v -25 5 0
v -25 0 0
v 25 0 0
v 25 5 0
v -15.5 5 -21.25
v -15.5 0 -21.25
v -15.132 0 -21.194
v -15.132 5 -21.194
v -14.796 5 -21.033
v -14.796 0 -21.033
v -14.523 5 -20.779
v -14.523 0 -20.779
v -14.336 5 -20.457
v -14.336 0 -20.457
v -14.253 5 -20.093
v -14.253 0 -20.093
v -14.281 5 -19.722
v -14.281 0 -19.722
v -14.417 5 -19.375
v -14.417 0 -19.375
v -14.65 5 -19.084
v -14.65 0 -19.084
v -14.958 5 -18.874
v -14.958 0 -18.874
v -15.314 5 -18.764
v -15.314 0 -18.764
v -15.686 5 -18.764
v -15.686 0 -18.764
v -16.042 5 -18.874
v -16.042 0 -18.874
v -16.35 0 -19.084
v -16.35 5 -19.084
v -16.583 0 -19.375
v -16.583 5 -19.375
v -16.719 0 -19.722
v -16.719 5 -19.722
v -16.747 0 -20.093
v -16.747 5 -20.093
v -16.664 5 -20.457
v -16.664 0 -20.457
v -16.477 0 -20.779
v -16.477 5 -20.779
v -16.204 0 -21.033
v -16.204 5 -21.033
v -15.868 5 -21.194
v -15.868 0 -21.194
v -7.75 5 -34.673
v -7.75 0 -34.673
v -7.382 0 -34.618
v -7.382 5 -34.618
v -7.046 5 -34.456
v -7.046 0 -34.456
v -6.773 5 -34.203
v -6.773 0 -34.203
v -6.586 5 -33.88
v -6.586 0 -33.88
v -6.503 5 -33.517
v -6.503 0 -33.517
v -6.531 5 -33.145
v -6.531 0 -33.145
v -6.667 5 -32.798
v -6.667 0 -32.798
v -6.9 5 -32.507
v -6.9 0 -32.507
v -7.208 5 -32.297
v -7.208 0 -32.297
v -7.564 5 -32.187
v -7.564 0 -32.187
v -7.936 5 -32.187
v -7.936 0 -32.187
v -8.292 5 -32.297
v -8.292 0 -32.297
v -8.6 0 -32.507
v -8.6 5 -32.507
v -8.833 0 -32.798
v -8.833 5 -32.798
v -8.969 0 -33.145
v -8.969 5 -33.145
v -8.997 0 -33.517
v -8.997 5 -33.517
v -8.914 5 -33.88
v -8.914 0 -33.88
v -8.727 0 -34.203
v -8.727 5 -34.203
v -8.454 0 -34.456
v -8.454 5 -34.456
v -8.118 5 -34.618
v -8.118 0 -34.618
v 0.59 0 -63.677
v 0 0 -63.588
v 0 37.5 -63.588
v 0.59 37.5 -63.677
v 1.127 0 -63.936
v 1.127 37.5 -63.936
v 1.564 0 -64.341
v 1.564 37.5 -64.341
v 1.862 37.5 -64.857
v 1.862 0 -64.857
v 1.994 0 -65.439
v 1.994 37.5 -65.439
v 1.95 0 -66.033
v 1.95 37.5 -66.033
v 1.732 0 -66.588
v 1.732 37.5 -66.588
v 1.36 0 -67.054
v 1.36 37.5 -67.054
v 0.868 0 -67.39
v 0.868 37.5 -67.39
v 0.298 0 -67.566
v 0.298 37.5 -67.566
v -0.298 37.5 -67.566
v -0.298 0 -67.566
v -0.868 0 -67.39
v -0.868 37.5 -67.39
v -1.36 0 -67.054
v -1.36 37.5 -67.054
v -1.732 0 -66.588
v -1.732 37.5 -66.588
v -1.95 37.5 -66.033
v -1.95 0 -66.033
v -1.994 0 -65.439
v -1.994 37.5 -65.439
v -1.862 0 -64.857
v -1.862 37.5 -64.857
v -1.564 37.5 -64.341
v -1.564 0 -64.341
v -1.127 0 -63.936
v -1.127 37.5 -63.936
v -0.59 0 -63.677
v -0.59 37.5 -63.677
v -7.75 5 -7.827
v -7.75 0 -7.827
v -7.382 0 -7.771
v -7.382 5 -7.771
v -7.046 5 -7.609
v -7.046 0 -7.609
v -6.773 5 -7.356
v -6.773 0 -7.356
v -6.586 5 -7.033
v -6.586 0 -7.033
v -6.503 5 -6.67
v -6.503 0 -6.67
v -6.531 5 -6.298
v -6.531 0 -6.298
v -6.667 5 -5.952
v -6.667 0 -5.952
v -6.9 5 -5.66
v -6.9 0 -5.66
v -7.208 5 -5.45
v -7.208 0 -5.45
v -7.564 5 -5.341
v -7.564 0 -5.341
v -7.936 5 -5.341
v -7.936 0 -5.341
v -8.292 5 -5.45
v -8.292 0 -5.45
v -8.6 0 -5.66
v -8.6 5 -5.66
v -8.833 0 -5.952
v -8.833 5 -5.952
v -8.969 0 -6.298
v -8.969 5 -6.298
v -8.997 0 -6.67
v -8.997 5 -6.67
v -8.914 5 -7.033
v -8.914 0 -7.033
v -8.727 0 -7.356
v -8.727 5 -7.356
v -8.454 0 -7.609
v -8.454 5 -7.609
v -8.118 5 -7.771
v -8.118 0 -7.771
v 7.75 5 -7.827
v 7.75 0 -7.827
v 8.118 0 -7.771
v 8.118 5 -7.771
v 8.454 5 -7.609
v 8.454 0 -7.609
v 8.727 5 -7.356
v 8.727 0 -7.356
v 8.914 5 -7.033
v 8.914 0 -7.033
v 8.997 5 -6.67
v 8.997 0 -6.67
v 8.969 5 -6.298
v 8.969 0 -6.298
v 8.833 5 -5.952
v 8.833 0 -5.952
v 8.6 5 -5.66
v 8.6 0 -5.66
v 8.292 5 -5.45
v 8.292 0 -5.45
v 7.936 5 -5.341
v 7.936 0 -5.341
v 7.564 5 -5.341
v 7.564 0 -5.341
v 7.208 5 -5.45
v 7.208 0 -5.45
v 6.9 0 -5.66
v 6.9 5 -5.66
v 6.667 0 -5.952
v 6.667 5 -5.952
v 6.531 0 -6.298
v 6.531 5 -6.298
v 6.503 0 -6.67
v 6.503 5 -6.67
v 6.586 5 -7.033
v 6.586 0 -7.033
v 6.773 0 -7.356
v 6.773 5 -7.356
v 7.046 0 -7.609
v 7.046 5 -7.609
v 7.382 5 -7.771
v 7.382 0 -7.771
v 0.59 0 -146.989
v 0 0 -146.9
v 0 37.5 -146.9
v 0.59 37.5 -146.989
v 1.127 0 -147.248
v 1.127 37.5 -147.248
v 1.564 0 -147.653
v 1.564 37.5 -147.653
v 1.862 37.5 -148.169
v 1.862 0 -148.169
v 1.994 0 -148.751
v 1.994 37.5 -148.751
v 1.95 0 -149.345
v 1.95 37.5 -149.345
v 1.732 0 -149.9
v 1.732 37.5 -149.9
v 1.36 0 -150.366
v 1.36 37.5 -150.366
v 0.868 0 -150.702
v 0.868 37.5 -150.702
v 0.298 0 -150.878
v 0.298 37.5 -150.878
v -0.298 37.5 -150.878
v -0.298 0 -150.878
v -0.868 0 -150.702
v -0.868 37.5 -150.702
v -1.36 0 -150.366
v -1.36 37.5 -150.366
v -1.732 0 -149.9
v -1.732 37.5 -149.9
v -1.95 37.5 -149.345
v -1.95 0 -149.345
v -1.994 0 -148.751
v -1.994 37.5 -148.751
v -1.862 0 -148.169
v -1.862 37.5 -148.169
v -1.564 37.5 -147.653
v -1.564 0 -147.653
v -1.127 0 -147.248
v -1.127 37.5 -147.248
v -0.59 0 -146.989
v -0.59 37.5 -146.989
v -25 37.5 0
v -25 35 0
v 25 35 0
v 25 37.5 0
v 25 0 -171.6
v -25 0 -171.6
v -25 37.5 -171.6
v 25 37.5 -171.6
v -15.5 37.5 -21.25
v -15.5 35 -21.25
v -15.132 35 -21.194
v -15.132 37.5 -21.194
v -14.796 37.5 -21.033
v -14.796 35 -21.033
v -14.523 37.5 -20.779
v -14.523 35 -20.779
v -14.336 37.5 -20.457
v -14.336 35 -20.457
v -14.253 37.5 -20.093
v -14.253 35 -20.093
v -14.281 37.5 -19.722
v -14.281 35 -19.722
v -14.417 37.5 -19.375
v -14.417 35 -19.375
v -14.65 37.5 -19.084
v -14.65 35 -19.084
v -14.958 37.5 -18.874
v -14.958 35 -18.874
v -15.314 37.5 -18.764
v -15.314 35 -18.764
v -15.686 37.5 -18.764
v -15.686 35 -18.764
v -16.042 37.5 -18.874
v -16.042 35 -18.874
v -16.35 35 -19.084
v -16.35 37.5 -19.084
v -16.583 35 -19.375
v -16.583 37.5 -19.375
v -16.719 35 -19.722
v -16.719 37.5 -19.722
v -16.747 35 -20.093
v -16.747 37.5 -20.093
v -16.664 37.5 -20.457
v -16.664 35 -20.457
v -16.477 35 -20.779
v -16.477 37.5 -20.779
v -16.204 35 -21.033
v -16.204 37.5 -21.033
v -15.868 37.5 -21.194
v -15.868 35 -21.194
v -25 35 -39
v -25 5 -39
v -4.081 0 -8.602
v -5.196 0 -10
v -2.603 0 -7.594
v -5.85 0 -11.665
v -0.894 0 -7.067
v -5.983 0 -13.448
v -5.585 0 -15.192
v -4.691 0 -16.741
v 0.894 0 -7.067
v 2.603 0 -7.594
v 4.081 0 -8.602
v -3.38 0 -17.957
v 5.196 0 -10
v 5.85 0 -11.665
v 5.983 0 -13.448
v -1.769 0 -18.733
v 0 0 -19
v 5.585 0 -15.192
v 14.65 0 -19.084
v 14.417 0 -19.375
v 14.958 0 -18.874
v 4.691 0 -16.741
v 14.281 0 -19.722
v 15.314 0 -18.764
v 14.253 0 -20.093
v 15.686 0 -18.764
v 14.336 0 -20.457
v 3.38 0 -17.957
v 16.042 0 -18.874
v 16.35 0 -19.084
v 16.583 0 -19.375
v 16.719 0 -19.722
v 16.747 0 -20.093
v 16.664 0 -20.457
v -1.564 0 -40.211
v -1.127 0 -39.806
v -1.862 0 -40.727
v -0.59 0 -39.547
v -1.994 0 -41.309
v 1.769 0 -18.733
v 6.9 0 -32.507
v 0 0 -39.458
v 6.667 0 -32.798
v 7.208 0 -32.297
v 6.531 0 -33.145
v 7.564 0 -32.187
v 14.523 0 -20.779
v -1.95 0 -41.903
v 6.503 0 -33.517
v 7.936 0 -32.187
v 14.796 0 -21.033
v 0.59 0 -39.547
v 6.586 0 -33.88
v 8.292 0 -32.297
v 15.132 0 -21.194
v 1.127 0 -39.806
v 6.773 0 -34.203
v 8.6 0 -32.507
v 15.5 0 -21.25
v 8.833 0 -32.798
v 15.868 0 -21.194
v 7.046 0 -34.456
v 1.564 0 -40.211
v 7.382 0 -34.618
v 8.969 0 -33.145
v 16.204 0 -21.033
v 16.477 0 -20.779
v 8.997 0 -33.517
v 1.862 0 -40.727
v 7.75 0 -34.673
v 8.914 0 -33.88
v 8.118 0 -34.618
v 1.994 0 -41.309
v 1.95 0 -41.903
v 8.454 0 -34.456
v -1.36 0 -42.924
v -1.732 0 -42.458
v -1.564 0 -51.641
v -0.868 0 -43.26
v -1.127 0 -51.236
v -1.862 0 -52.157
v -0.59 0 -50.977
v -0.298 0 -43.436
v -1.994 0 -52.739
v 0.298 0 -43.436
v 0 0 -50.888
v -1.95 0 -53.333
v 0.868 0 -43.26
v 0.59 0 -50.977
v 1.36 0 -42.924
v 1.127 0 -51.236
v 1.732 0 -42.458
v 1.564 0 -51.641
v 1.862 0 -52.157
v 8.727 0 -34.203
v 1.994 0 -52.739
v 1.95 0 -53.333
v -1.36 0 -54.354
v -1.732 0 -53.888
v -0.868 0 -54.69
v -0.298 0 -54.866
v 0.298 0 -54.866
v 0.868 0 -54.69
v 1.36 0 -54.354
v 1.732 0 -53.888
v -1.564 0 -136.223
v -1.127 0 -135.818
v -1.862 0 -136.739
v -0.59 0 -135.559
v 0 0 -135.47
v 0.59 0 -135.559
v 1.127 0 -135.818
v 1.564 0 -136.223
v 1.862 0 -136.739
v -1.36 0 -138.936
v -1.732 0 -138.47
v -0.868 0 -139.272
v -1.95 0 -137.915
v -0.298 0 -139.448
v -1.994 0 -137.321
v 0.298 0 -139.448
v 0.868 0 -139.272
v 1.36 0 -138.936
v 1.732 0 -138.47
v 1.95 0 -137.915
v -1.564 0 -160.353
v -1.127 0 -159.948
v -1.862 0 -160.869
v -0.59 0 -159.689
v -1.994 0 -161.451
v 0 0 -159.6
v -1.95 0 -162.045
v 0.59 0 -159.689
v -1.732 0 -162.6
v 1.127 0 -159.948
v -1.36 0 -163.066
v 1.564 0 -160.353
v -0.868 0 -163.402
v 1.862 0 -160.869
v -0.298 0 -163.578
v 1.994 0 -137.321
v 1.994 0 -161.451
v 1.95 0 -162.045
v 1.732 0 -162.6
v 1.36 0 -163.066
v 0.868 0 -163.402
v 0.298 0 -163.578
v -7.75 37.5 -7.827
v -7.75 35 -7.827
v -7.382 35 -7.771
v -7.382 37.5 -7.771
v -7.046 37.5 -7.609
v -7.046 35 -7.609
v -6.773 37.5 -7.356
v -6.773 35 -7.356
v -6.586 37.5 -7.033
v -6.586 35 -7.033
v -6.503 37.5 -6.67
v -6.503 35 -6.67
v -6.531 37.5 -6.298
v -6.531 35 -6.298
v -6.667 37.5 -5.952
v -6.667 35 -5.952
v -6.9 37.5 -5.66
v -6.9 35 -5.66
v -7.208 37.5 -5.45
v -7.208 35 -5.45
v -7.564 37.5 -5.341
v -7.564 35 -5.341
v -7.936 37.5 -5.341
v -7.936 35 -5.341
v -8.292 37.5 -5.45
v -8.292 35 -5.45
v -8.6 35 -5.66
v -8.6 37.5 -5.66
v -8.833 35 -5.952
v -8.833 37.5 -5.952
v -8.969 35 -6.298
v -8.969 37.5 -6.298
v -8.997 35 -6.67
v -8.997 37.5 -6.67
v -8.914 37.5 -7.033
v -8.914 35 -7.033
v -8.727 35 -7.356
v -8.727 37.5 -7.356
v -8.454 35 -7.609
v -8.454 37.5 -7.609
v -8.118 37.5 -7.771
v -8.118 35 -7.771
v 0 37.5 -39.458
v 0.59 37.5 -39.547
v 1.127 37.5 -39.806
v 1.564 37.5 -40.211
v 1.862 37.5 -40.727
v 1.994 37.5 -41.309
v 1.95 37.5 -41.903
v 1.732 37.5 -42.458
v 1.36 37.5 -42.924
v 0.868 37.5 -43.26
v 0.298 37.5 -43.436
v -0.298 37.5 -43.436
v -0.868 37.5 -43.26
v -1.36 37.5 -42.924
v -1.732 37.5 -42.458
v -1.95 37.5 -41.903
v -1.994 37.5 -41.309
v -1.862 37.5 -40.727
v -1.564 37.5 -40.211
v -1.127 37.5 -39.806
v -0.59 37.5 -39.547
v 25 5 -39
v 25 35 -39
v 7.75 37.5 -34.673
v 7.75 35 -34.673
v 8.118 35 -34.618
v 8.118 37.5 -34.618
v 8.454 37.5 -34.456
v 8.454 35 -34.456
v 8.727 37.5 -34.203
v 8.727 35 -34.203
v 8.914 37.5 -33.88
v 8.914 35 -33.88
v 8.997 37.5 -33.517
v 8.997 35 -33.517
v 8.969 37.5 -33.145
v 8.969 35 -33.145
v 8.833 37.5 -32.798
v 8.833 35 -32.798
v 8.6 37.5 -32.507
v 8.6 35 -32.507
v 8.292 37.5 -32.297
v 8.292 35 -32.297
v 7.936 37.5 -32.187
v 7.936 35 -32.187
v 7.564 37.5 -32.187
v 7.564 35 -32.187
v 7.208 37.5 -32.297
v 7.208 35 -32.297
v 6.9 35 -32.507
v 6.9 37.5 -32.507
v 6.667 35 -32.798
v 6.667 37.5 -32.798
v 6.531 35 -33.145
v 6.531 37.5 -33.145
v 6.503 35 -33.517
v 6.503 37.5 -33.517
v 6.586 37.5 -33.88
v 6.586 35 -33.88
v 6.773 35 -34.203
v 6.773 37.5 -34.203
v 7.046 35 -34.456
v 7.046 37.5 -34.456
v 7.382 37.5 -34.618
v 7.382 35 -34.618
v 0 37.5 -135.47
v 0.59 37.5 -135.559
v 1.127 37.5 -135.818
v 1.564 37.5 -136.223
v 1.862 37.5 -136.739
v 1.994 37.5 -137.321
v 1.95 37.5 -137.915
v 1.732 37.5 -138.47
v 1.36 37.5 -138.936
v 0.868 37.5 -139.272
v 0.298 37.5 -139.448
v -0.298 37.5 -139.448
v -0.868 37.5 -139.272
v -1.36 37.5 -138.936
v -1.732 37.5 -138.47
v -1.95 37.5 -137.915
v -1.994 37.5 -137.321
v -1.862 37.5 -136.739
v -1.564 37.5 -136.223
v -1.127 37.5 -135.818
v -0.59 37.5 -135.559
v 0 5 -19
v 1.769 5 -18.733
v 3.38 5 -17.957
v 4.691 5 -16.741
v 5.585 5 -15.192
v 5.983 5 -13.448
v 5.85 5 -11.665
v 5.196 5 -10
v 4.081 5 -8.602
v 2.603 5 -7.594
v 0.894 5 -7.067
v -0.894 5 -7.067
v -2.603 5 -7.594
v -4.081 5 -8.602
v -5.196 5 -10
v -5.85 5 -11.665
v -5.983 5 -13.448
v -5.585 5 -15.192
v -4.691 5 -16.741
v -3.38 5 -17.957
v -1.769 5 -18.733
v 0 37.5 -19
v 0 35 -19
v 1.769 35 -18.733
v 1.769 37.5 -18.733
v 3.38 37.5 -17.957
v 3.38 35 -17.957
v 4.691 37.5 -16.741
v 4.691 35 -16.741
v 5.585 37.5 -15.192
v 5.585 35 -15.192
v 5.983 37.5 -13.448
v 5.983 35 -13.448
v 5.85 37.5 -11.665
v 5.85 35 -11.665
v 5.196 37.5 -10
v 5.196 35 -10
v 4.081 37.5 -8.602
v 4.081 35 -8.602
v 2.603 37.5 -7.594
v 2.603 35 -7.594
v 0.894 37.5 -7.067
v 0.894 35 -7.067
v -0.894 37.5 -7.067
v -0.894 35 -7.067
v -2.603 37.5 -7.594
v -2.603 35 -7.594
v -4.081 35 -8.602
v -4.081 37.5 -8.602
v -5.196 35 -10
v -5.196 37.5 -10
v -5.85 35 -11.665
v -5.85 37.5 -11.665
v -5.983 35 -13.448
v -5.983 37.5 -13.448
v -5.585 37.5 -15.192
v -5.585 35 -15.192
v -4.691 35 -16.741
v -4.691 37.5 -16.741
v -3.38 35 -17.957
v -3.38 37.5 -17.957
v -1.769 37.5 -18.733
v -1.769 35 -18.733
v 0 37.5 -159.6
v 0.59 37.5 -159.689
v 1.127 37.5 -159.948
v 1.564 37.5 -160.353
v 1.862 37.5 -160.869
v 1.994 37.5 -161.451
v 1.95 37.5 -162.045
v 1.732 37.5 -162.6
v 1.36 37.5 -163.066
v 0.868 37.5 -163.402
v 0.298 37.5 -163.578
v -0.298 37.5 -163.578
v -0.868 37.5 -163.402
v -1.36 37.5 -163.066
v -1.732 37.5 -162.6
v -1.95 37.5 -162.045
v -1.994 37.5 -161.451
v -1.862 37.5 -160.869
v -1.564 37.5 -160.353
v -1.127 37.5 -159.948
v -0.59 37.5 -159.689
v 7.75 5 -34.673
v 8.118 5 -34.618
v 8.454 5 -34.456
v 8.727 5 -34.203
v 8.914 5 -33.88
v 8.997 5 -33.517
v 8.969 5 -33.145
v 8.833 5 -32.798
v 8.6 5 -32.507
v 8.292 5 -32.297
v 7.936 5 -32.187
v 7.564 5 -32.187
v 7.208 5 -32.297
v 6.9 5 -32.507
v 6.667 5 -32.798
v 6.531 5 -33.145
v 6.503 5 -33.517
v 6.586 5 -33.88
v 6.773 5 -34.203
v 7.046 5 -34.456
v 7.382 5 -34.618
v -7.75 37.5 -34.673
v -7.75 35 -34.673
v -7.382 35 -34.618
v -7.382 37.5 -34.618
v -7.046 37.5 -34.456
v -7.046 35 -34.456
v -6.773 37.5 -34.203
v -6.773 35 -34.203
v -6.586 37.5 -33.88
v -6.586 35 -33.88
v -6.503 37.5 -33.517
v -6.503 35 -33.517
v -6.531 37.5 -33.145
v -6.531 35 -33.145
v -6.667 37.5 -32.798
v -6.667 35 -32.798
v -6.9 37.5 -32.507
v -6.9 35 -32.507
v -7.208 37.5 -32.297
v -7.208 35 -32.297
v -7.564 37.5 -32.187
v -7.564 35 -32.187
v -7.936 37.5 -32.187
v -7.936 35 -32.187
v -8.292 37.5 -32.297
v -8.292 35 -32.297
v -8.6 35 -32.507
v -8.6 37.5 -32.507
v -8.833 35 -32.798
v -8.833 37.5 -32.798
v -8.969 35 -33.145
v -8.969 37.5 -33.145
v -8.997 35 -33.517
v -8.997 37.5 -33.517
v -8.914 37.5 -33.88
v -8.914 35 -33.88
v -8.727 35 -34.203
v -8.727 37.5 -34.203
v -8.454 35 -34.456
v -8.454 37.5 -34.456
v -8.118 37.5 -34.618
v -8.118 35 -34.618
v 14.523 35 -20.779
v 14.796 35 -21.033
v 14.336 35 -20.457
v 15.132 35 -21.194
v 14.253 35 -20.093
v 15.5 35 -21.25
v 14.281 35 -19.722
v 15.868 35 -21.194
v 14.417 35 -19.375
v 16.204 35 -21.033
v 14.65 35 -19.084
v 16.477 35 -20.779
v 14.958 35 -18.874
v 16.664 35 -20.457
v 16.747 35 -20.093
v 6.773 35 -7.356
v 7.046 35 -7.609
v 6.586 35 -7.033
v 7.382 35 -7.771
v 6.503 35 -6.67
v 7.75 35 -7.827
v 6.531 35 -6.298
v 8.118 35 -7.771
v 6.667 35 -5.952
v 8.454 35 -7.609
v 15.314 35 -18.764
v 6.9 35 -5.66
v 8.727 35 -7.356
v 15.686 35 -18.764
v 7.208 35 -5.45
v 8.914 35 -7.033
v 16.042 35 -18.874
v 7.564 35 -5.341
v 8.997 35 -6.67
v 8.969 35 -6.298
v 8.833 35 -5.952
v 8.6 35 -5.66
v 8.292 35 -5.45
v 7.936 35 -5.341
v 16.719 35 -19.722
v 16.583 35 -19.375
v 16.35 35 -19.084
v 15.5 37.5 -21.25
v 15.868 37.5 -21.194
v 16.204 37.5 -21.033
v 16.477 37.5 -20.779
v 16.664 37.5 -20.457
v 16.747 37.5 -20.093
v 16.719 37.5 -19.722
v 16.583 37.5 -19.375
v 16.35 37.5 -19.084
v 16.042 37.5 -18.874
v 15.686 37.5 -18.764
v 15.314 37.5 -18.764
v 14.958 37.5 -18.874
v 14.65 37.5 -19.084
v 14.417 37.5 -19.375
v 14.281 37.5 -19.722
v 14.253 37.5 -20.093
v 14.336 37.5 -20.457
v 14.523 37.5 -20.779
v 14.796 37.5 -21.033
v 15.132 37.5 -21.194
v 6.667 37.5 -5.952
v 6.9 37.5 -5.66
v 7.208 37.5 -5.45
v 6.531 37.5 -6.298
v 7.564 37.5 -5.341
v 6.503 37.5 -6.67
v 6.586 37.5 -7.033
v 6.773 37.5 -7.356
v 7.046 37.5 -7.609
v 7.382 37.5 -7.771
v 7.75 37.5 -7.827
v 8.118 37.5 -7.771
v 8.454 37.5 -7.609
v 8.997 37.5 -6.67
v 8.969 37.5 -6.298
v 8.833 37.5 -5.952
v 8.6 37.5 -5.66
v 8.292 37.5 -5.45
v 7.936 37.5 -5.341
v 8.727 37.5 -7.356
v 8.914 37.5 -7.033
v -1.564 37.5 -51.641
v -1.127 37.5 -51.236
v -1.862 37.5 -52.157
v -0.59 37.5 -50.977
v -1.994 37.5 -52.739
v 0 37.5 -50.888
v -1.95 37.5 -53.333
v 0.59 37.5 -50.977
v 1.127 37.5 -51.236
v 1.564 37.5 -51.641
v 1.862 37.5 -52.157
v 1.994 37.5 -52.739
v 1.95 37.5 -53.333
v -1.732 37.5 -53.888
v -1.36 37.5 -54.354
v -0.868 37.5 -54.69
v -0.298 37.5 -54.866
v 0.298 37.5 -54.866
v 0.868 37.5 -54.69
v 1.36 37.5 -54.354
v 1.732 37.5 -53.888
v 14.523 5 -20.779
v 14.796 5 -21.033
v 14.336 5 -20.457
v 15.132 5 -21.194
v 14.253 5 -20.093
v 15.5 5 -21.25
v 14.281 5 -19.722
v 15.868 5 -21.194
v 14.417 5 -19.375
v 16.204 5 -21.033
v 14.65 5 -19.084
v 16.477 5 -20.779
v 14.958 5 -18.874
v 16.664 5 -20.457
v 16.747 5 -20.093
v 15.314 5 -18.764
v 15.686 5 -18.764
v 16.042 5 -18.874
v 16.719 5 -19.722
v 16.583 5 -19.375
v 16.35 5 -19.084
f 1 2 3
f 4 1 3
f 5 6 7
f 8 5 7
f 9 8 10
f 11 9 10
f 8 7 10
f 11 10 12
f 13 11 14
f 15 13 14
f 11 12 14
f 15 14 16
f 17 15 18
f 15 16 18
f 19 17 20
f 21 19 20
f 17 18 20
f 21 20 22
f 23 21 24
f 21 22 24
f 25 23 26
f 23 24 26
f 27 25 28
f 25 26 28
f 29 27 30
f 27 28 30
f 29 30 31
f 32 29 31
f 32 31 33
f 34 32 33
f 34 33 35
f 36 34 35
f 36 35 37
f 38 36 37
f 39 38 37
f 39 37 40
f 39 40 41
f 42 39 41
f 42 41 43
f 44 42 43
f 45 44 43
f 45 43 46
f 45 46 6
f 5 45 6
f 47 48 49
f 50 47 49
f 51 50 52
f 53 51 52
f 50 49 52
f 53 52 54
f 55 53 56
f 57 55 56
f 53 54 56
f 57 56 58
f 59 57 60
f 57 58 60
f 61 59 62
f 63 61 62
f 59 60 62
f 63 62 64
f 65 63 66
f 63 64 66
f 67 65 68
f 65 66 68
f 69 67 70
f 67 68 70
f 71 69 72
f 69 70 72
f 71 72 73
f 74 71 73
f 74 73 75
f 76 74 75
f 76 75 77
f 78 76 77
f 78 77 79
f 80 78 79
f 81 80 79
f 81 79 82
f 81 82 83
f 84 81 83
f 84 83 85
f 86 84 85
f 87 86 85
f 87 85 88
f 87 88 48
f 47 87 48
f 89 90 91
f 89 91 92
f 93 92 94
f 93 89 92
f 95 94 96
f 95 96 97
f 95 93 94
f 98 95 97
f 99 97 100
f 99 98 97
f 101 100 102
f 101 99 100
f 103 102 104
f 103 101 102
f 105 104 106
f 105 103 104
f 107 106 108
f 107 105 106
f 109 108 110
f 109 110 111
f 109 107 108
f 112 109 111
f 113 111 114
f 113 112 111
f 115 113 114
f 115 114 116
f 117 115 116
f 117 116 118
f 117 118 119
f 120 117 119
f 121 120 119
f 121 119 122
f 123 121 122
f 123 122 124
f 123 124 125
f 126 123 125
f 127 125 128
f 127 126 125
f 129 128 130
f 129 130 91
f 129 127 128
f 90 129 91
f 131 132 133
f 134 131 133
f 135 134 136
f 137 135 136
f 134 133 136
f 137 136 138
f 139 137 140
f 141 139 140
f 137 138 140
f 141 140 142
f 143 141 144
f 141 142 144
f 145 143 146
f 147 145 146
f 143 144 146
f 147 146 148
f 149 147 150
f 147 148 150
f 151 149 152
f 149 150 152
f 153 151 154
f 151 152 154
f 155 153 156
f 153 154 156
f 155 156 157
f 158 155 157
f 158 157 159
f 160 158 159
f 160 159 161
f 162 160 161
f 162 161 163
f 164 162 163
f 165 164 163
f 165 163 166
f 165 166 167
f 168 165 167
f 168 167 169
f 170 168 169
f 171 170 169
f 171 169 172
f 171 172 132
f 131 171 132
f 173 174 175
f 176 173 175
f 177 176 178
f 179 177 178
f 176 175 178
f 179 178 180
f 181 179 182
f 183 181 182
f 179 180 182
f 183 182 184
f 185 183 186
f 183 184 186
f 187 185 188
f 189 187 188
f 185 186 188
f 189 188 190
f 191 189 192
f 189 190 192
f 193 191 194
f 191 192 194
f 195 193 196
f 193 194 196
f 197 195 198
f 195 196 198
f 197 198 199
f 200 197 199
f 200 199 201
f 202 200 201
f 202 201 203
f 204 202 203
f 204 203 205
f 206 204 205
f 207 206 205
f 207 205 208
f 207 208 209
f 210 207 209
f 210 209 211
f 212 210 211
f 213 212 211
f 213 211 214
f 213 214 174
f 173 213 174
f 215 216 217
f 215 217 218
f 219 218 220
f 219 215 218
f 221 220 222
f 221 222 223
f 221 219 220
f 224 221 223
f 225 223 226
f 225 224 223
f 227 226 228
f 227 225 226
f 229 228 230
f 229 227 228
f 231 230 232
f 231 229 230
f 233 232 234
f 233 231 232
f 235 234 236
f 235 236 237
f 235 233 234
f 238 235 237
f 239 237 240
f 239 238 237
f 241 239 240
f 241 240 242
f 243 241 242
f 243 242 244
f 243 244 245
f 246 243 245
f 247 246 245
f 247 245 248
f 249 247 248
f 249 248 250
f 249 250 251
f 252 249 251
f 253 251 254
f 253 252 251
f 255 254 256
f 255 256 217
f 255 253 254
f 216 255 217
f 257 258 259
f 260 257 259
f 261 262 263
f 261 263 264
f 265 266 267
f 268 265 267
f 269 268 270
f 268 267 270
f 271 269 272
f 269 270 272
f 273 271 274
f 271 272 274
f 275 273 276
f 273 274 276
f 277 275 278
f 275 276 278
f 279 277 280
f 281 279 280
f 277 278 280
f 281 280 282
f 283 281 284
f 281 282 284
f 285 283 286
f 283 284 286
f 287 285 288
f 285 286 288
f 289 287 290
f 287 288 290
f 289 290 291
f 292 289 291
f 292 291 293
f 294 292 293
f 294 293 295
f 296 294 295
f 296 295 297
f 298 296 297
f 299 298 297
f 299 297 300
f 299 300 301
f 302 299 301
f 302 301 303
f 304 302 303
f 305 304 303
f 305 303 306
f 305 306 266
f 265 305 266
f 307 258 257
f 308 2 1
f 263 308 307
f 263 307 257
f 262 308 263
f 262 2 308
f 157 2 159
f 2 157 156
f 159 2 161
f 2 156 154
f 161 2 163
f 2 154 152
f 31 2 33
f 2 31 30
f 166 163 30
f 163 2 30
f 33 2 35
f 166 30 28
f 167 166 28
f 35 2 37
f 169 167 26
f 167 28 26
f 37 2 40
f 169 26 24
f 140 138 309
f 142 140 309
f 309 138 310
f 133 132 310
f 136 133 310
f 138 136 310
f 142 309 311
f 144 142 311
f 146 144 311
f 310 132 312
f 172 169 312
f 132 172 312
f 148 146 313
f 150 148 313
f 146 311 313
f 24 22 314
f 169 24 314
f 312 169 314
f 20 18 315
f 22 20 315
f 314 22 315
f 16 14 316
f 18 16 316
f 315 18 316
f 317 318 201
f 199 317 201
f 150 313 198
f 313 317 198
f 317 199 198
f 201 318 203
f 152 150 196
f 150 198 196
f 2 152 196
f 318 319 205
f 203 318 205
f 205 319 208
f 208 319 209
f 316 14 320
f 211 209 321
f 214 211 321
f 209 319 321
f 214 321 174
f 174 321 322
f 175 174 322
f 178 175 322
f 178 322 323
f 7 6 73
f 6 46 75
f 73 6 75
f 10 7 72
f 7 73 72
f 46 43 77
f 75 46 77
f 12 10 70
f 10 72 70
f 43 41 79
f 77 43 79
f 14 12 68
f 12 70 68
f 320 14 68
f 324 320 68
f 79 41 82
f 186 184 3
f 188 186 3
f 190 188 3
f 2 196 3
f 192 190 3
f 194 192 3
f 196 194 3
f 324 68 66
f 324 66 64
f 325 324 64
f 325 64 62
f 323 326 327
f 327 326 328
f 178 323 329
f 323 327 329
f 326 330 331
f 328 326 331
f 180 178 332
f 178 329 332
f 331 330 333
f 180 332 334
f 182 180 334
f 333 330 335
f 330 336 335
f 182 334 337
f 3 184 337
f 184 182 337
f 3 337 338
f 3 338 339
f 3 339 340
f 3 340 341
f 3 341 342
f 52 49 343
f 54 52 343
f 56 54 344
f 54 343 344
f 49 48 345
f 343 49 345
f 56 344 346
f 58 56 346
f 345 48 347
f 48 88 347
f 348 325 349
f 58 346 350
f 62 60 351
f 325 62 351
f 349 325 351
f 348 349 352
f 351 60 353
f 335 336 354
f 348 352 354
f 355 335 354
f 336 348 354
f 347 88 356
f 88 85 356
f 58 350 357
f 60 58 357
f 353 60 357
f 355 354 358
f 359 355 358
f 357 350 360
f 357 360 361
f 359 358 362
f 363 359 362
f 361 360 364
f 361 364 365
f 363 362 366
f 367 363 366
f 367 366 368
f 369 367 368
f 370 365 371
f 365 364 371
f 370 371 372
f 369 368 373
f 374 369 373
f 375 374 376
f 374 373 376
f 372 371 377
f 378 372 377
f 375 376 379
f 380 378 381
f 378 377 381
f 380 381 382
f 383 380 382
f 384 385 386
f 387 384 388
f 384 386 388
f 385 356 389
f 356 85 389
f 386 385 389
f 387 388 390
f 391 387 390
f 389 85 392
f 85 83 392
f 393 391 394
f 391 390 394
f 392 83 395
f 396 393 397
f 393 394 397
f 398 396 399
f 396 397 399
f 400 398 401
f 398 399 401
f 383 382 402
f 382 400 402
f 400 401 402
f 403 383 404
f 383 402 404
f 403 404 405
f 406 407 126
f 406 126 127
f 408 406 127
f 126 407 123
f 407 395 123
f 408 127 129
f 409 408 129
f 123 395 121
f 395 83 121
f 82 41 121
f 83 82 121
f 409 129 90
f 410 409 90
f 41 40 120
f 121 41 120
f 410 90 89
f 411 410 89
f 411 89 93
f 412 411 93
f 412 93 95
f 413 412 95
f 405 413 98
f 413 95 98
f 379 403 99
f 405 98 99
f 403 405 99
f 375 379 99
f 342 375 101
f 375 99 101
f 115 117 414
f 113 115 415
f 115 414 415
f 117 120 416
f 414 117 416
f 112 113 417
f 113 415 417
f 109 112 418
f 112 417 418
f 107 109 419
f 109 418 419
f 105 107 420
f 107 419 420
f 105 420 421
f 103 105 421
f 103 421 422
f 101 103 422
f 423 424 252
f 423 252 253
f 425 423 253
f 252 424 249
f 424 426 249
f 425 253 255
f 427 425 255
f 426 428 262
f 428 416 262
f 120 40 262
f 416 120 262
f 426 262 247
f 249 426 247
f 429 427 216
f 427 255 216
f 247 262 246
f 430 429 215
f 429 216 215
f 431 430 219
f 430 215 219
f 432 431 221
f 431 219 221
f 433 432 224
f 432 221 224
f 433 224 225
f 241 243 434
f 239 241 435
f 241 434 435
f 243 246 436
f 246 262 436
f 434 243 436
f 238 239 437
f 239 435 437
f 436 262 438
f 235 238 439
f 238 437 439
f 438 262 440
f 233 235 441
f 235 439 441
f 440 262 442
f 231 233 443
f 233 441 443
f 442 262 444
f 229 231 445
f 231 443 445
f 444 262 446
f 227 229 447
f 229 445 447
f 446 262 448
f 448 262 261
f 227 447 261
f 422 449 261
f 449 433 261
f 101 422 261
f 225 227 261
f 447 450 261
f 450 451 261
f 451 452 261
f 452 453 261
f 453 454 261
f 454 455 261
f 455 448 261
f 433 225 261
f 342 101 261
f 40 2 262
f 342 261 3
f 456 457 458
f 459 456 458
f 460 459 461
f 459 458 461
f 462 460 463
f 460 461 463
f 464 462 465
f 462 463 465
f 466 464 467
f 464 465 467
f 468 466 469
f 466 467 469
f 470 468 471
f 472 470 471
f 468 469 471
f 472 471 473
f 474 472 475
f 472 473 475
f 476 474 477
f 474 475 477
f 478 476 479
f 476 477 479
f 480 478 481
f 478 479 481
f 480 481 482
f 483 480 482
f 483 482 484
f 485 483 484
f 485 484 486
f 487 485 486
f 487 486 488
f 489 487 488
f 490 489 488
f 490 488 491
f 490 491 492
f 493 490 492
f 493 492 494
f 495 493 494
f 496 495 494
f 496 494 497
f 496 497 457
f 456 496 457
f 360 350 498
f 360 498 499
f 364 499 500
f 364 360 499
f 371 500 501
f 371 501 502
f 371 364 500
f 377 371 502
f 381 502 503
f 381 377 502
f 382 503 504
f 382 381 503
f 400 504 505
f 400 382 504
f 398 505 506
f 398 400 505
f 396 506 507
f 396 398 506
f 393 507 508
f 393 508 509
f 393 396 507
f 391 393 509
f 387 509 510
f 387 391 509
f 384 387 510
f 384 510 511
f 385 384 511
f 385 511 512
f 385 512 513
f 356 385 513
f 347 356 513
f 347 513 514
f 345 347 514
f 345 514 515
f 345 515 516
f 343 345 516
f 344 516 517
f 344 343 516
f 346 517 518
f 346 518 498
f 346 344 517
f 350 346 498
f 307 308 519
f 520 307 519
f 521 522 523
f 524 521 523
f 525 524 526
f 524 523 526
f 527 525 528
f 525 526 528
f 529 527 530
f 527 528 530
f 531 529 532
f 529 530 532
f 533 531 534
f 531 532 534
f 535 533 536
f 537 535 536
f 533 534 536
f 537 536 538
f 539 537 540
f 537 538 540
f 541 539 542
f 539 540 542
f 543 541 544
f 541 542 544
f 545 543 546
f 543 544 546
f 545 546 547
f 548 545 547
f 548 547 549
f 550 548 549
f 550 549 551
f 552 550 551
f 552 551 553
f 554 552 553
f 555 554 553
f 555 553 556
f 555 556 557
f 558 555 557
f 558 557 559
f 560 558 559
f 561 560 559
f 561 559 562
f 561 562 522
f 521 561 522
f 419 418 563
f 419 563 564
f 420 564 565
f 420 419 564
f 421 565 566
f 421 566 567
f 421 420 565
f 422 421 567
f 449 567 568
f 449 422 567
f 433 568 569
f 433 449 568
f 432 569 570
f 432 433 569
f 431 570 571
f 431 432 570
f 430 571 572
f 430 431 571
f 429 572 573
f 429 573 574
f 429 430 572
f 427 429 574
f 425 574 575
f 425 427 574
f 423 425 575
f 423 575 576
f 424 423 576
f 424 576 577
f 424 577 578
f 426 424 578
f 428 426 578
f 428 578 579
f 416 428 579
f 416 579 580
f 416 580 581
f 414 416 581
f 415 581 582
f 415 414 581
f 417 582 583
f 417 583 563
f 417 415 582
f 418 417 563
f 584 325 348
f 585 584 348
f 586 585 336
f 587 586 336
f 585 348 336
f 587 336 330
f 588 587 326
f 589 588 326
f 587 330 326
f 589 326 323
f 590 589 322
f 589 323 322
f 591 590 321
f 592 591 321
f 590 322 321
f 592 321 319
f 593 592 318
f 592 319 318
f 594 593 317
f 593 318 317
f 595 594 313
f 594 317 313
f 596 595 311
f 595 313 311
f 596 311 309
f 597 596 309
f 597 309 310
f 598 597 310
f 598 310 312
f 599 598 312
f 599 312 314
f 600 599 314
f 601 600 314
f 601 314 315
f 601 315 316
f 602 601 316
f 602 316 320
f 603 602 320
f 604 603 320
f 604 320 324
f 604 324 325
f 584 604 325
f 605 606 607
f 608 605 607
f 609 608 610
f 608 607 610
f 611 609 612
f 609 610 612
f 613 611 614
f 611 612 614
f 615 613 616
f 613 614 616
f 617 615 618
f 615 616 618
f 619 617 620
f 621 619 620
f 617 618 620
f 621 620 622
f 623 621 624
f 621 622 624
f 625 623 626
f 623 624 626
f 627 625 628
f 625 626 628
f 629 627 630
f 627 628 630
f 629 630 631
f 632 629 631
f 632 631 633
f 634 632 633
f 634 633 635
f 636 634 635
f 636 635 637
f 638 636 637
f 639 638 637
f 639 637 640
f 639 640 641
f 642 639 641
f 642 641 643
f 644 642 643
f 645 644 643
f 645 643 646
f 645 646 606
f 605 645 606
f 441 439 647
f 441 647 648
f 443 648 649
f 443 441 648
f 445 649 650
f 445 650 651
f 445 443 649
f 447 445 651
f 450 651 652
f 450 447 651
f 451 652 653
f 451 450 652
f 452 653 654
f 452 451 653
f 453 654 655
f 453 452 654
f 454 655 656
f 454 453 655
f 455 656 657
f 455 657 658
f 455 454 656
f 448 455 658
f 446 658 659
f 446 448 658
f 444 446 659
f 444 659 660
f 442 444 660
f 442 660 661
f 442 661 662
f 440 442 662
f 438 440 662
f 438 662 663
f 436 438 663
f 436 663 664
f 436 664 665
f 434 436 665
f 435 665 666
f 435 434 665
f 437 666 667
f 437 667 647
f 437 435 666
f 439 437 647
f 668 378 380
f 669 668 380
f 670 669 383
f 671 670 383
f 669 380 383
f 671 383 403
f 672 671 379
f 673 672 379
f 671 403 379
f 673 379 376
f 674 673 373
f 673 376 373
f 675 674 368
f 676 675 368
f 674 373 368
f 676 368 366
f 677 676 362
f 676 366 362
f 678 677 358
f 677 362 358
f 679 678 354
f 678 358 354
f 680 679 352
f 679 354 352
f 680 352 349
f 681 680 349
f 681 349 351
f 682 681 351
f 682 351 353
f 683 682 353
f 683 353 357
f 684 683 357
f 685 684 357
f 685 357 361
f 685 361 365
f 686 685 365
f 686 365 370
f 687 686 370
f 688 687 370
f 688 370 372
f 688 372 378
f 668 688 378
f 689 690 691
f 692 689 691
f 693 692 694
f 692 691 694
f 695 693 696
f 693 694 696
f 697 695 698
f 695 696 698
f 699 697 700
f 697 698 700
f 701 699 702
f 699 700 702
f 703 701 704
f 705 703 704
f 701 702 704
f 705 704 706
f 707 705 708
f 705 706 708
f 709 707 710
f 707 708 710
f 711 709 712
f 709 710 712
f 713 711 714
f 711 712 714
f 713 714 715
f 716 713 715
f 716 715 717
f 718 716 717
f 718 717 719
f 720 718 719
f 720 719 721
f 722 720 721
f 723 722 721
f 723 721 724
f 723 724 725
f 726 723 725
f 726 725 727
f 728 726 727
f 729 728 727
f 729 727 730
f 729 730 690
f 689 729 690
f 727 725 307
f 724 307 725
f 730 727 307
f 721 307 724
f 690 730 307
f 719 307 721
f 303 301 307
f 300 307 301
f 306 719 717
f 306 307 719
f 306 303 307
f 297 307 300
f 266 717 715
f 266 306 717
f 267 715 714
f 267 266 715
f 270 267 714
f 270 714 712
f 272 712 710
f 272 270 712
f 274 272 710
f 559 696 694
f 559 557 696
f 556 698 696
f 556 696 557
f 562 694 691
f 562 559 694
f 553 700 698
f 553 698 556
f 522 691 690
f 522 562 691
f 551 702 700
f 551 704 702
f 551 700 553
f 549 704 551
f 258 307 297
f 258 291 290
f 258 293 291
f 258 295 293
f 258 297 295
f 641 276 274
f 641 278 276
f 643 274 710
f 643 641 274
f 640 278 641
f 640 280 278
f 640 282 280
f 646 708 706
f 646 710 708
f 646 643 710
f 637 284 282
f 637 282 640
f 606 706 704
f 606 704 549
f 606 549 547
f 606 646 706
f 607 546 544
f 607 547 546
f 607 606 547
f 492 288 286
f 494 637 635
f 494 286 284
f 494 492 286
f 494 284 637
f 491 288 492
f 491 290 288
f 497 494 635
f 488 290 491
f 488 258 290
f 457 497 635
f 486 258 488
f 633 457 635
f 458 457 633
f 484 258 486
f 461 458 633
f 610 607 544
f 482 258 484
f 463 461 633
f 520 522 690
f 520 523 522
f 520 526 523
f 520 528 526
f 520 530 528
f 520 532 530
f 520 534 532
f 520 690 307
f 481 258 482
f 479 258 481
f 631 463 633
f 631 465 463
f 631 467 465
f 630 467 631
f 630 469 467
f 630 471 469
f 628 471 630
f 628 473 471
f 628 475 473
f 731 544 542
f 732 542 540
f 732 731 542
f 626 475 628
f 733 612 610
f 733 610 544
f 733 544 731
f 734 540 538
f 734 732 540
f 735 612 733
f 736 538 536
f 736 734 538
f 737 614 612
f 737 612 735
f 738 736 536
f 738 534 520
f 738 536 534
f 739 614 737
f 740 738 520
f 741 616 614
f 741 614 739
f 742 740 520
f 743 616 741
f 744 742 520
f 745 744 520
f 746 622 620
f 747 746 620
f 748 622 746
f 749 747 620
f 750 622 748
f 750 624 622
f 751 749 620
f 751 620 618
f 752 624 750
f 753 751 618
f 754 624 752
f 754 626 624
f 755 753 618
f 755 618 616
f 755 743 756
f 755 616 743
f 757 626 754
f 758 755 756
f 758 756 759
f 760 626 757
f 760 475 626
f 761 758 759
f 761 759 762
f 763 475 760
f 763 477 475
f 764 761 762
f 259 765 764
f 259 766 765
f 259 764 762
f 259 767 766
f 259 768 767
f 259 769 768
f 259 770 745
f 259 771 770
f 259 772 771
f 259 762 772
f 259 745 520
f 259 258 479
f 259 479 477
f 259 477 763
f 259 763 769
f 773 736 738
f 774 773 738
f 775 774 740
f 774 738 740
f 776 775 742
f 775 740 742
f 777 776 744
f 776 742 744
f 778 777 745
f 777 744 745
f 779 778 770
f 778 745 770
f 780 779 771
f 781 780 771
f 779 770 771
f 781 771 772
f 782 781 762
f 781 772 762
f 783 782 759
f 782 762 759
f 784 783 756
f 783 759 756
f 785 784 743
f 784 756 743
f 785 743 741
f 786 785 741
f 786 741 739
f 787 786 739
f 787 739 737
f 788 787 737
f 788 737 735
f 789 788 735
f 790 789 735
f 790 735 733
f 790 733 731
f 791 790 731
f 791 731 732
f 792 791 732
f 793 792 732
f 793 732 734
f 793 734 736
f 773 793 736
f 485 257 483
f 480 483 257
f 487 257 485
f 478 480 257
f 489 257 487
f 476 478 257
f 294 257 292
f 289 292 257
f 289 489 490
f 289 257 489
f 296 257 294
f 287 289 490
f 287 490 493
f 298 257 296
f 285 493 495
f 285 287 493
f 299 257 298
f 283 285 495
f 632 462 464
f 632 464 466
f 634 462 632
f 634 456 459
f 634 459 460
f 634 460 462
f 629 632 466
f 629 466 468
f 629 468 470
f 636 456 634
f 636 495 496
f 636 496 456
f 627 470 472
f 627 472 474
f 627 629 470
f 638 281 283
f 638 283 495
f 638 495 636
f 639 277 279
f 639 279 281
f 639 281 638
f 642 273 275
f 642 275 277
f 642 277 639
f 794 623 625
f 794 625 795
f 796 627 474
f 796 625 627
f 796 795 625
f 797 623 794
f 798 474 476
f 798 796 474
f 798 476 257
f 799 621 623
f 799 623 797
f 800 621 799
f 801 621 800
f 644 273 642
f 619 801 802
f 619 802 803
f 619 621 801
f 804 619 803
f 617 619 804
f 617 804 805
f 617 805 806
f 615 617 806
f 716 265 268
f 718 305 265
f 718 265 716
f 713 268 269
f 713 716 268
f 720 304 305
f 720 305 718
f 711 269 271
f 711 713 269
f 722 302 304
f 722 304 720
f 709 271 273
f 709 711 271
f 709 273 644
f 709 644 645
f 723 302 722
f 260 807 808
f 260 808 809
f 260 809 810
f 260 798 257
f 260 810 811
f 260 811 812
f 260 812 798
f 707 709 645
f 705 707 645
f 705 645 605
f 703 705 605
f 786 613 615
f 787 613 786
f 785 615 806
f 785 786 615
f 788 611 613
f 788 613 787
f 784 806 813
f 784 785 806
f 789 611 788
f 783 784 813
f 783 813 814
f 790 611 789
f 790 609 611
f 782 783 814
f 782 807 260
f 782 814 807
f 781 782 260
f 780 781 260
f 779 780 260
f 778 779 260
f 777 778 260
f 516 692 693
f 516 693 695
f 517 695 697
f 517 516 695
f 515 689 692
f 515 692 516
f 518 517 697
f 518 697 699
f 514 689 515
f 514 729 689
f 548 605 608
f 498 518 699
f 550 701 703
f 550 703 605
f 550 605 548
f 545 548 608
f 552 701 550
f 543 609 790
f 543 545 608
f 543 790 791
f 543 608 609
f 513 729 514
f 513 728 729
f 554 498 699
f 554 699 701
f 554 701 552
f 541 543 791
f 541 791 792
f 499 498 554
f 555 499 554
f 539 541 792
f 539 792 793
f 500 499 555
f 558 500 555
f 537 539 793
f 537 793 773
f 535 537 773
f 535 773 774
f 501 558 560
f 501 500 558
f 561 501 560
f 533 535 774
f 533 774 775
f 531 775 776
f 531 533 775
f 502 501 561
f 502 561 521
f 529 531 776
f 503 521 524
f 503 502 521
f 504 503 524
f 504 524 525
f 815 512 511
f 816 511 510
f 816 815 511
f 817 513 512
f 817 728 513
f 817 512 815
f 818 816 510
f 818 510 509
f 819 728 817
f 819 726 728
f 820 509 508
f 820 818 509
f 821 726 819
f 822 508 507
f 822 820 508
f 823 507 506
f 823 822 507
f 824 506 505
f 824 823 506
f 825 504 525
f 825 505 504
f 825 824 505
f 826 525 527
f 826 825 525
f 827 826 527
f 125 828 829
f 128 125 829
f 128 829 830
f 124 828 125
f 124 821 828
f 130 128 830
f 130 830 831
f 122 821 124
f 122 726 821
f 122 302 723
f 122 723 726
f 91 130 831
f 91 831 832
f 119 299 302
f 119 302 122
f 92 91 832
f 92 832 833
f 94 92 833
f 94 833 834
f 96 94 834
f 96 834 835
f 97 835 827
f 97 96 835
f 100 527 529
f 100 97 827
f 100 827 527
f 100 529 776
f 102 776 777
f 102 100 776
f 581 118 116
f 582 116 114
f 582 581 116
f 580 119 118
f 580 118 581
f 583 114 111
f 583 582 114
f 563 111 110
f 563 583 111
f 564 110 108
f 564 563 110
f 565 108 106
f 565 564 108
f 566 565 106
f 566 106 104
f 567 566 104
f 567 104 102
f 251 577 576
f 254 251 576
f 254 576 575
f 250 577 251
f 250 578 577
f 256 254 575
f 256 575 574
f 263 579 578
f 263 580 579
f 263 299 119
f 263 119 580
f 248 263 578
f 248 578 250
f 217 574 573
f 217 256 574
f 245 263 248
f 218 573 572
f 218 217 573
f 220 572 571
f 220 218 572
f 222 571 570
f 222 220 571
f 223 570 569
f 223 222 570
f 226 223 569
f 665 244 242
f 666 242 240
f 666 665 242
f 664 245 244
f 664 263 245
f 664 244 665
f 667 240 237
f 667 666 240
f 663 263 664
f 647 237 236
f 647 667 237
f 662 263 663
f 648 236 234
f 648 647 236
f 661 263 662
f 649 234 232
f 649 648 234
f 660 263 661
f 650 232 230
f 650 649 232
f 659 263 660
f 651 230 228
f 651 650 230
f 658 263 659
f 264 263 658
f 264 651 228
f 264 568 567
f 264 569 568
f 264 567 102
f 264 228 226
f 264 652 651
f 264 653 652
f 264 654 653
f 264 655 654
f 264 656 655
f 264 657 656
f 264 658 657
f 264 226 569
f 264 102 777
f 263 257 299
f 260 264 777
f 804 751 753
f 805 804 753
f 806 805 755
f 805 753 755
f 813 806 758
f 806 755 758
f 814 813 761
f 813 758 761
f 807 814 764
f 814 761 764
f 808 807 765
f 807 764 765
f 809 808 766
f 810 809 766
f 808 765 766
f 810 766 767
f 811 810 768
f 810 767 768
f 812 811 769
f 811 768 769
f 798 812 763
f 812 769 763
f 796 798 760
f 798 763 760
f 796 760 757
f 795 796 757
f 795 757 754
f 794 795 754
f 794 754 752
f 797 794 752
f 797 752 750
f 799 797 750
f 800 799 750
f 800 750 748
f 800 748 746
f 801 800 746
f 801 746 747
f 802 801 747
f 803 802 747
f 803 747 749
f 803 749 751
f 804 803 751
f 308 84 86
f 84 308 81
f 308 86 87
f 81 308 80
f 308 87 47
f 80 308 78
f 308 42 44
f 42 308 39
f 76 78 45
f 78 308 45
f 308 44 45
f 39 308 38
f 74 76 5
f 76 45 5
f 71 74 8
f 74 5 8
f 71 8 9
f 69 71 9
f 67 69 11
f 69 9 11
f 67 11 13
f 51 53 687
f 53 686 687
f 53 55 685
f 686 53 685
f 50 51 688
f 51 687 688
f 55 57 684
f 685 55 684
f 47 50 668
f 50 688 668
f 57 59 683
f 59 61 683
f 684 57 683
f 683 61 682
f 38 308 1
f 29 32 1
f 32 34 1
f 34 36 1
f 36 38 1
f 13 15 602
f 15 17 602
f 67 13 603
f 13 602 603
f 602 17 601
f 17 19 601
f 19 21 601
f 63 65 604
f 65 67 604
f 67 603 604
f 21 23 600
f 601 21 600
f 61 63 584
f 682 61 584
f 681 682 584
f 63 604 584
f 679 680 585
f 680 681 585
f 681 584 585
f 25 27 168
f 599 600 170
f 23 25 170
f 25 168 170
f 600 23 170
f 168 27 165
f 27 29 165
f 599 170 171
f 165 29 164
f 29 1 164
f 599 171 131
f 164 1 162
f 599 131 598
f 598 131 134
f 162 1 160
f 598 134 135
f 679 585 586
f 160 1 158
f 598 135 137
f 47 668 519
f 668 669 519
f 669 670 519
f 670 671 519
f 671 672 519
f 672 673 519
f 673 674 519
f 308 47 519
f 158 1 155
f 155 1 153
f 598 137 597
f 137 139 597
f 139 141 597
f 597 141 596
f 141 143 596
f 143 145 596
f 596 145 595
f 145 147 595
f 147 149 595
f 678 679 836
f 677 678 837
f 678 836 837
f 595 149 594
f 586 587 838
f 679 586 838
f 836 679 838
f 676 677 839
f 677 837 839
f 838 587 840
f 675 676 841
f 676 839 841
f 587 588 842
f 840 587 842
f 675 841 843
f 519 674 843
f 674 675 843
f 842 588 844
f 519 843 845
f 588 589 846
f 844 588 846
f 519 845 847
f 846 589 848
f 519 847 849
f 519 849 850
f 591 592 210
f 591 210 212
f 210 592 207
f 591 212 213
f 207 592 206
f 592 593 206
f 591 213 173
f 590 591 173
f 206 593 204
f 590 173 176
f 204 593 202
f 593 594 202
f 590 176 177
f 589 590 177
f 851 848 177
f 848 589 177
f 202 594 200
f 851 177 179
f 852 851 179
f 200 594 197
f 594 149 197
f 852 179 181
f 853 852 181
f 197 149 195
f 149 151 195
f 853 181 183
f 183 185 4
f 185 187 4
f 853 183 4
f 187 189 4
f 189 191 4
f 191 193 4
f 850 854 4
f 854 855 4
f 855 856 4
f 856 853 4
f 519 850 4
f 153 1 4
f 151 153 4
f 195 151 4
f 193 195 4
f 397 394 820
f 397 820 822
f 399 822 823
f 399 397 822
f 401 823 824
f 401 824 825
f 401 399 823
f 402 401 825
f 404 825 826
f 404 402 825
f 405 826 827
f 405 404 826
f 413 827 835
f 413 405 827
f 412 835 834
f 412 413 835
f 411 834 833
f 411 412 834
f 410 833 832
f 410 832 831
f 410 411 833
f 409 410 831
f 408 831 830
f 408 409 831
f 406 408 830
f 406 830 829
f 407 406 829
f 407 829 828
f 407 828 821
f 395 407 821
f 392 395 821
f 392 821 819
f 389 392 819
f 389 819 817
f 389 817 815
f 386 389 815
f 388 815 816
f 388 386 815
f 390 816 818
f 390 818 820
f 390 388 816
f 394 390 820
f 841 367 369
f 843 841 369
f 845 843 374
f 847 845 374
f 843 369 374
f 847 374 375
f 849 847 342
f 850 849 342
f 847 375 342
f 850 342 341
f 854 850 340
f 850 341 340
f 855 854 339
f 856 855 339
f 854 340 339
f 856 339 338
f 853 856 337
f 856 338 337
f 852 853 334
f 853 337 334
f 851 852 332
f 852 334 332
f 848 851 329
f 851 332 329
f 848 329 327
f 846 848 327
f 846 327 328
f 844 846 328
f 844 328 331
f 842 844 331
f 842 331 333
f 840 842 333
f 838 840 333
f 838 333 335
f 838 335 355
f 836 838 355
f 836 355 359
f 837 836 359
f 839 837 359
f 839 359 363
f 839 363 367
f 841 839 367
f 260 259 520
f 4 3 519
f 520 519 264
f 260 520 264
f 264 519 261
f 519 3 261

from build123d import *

# Parameters (mm, degrees)
SKETCH1_W           = 50
SKETCH1_H           = 171.6
SKETCH1_R           = 2
BOSS_EXTRUDE1_DEPTH = 37.5
CUT_EXTRUDE4_START  = -5
SKETCH2_W           = 50
SKETCH2_H           = 39
SKETCH2_R           = 6
SKETCH2_R_2         = 1.25
CUT_EXTRUDE4_DEPTH  = 30
SKETCH2_3_R         = 6
SKETCH2_3_R_2       = 1.25
CUT_EXTRUDE5_DEPTH  = 178.419869237


with BuildPart() as part:
    # Sketch1 → Boss-Extrude1 (new body)
    with BuildSketch(Plane(origin=(0, 0, 0), x_dir=(1, 0, 0), z_dir=(0, 1, 0))):
        with Locations((0, 85.8)):
            Rectangle(SKETCH1_W, SKETCH1_H)
        with Locations((0, 148.9)):
            Circle(SKETCH1_R, mode=Mode.SUBTRACT)
        with Locations((0, 161.6)):
            Circle(SKETCH1_R, mode=Mode.SUBTRACT)
        with Locations((0, 137.47)):
            Circle(SKETCH1_R, mode=Mode.SUBTRACT)
        with Locations((0, 52.888)):
            Circle(SKETCH1_R, mode=Mode.SUBTRACT)
        with Locations((0, 65.588)):
            Circle(SKETCH1_R, mode=Mode.SUBTRACT)
        with Locations((0, 41.458)):
            Circle(SKETCH1_R, mode=Mode.SUBTRACT)
    extrude(amount=BOSS_EXTRUDE1_DEPTH)

    # Sketch2 → Cut-Extrude4 (cut)
    with BuildSketch(Plane.XZ.offset(CUT_EXTRUDE4_START)):
        with Locations((0, -19.5)):
            Rectangle(SKETCH2_W, SKETCH2_H)
        with Locations((0, -13)):
            Circle(SKETCH2_R, mode=Mode.SUBTRACT)
        with Locations((-15.5, -20)):
            Circle(SKETCH2_R_2, mode=Mode.SUBTRACT)
        with Locations((-7.75, -6.576606241)):
            Circle(SKETCH2_R_2, mode=Mode.SUBTRACT)
        with Locations((7.75, -6.576606241)):
            Circle(SKETCH2_R_2, mode=Mode.SUBTRACT)
        with Locations((15.5, -20)):
            Circle(SKETCH2_R_2, mode=Mode.SUBTRACT)
        with Locations((7.75, -33.423393759)):
            Circle(SKETCH2_R_2, mode=Mode.SUBTRACT)
        with Locations((-7.75, -33.423393759)):
            Circle(SKETCH2_R_2, mode=Mode.SUBTRACT)
    extrude(amount=-CUT_EXTRUDE4_DEPTH, mode=Mode.SUBTRACT)

    # Sketch2<3> → Cut-Extrude5 (cut, through all)
    with BuildSketch(Plane.XZ):
        with Locations((0, -13)):
            Circle(SKETCH2_3_R)
        with Locations((-15.5, -20)):
            Circle(SKETCH2_3_R_2)
        with Locations((-7.75, -6.576606241)):
            Circle(SKETCH2_3_R_2)
        with Locations((7.75, -6.576606241)):
            Circle(SKETCH2_3_R_2)
        with Locations((15.5, -20)):
            Circle(SKETCH2_3_R_2)
        with Locations((7.75, -33.423393759)):
            Circle(SKETCH2_3_R_2)
        with Locations((-7.75, -33.423393759)):
            Circle(SKETCH2_3_R_2)
    extrude(amount=-CUT_EXTRUDE5_DEPTH, mode=Mode.SUBTRACT)


solid = part.part
